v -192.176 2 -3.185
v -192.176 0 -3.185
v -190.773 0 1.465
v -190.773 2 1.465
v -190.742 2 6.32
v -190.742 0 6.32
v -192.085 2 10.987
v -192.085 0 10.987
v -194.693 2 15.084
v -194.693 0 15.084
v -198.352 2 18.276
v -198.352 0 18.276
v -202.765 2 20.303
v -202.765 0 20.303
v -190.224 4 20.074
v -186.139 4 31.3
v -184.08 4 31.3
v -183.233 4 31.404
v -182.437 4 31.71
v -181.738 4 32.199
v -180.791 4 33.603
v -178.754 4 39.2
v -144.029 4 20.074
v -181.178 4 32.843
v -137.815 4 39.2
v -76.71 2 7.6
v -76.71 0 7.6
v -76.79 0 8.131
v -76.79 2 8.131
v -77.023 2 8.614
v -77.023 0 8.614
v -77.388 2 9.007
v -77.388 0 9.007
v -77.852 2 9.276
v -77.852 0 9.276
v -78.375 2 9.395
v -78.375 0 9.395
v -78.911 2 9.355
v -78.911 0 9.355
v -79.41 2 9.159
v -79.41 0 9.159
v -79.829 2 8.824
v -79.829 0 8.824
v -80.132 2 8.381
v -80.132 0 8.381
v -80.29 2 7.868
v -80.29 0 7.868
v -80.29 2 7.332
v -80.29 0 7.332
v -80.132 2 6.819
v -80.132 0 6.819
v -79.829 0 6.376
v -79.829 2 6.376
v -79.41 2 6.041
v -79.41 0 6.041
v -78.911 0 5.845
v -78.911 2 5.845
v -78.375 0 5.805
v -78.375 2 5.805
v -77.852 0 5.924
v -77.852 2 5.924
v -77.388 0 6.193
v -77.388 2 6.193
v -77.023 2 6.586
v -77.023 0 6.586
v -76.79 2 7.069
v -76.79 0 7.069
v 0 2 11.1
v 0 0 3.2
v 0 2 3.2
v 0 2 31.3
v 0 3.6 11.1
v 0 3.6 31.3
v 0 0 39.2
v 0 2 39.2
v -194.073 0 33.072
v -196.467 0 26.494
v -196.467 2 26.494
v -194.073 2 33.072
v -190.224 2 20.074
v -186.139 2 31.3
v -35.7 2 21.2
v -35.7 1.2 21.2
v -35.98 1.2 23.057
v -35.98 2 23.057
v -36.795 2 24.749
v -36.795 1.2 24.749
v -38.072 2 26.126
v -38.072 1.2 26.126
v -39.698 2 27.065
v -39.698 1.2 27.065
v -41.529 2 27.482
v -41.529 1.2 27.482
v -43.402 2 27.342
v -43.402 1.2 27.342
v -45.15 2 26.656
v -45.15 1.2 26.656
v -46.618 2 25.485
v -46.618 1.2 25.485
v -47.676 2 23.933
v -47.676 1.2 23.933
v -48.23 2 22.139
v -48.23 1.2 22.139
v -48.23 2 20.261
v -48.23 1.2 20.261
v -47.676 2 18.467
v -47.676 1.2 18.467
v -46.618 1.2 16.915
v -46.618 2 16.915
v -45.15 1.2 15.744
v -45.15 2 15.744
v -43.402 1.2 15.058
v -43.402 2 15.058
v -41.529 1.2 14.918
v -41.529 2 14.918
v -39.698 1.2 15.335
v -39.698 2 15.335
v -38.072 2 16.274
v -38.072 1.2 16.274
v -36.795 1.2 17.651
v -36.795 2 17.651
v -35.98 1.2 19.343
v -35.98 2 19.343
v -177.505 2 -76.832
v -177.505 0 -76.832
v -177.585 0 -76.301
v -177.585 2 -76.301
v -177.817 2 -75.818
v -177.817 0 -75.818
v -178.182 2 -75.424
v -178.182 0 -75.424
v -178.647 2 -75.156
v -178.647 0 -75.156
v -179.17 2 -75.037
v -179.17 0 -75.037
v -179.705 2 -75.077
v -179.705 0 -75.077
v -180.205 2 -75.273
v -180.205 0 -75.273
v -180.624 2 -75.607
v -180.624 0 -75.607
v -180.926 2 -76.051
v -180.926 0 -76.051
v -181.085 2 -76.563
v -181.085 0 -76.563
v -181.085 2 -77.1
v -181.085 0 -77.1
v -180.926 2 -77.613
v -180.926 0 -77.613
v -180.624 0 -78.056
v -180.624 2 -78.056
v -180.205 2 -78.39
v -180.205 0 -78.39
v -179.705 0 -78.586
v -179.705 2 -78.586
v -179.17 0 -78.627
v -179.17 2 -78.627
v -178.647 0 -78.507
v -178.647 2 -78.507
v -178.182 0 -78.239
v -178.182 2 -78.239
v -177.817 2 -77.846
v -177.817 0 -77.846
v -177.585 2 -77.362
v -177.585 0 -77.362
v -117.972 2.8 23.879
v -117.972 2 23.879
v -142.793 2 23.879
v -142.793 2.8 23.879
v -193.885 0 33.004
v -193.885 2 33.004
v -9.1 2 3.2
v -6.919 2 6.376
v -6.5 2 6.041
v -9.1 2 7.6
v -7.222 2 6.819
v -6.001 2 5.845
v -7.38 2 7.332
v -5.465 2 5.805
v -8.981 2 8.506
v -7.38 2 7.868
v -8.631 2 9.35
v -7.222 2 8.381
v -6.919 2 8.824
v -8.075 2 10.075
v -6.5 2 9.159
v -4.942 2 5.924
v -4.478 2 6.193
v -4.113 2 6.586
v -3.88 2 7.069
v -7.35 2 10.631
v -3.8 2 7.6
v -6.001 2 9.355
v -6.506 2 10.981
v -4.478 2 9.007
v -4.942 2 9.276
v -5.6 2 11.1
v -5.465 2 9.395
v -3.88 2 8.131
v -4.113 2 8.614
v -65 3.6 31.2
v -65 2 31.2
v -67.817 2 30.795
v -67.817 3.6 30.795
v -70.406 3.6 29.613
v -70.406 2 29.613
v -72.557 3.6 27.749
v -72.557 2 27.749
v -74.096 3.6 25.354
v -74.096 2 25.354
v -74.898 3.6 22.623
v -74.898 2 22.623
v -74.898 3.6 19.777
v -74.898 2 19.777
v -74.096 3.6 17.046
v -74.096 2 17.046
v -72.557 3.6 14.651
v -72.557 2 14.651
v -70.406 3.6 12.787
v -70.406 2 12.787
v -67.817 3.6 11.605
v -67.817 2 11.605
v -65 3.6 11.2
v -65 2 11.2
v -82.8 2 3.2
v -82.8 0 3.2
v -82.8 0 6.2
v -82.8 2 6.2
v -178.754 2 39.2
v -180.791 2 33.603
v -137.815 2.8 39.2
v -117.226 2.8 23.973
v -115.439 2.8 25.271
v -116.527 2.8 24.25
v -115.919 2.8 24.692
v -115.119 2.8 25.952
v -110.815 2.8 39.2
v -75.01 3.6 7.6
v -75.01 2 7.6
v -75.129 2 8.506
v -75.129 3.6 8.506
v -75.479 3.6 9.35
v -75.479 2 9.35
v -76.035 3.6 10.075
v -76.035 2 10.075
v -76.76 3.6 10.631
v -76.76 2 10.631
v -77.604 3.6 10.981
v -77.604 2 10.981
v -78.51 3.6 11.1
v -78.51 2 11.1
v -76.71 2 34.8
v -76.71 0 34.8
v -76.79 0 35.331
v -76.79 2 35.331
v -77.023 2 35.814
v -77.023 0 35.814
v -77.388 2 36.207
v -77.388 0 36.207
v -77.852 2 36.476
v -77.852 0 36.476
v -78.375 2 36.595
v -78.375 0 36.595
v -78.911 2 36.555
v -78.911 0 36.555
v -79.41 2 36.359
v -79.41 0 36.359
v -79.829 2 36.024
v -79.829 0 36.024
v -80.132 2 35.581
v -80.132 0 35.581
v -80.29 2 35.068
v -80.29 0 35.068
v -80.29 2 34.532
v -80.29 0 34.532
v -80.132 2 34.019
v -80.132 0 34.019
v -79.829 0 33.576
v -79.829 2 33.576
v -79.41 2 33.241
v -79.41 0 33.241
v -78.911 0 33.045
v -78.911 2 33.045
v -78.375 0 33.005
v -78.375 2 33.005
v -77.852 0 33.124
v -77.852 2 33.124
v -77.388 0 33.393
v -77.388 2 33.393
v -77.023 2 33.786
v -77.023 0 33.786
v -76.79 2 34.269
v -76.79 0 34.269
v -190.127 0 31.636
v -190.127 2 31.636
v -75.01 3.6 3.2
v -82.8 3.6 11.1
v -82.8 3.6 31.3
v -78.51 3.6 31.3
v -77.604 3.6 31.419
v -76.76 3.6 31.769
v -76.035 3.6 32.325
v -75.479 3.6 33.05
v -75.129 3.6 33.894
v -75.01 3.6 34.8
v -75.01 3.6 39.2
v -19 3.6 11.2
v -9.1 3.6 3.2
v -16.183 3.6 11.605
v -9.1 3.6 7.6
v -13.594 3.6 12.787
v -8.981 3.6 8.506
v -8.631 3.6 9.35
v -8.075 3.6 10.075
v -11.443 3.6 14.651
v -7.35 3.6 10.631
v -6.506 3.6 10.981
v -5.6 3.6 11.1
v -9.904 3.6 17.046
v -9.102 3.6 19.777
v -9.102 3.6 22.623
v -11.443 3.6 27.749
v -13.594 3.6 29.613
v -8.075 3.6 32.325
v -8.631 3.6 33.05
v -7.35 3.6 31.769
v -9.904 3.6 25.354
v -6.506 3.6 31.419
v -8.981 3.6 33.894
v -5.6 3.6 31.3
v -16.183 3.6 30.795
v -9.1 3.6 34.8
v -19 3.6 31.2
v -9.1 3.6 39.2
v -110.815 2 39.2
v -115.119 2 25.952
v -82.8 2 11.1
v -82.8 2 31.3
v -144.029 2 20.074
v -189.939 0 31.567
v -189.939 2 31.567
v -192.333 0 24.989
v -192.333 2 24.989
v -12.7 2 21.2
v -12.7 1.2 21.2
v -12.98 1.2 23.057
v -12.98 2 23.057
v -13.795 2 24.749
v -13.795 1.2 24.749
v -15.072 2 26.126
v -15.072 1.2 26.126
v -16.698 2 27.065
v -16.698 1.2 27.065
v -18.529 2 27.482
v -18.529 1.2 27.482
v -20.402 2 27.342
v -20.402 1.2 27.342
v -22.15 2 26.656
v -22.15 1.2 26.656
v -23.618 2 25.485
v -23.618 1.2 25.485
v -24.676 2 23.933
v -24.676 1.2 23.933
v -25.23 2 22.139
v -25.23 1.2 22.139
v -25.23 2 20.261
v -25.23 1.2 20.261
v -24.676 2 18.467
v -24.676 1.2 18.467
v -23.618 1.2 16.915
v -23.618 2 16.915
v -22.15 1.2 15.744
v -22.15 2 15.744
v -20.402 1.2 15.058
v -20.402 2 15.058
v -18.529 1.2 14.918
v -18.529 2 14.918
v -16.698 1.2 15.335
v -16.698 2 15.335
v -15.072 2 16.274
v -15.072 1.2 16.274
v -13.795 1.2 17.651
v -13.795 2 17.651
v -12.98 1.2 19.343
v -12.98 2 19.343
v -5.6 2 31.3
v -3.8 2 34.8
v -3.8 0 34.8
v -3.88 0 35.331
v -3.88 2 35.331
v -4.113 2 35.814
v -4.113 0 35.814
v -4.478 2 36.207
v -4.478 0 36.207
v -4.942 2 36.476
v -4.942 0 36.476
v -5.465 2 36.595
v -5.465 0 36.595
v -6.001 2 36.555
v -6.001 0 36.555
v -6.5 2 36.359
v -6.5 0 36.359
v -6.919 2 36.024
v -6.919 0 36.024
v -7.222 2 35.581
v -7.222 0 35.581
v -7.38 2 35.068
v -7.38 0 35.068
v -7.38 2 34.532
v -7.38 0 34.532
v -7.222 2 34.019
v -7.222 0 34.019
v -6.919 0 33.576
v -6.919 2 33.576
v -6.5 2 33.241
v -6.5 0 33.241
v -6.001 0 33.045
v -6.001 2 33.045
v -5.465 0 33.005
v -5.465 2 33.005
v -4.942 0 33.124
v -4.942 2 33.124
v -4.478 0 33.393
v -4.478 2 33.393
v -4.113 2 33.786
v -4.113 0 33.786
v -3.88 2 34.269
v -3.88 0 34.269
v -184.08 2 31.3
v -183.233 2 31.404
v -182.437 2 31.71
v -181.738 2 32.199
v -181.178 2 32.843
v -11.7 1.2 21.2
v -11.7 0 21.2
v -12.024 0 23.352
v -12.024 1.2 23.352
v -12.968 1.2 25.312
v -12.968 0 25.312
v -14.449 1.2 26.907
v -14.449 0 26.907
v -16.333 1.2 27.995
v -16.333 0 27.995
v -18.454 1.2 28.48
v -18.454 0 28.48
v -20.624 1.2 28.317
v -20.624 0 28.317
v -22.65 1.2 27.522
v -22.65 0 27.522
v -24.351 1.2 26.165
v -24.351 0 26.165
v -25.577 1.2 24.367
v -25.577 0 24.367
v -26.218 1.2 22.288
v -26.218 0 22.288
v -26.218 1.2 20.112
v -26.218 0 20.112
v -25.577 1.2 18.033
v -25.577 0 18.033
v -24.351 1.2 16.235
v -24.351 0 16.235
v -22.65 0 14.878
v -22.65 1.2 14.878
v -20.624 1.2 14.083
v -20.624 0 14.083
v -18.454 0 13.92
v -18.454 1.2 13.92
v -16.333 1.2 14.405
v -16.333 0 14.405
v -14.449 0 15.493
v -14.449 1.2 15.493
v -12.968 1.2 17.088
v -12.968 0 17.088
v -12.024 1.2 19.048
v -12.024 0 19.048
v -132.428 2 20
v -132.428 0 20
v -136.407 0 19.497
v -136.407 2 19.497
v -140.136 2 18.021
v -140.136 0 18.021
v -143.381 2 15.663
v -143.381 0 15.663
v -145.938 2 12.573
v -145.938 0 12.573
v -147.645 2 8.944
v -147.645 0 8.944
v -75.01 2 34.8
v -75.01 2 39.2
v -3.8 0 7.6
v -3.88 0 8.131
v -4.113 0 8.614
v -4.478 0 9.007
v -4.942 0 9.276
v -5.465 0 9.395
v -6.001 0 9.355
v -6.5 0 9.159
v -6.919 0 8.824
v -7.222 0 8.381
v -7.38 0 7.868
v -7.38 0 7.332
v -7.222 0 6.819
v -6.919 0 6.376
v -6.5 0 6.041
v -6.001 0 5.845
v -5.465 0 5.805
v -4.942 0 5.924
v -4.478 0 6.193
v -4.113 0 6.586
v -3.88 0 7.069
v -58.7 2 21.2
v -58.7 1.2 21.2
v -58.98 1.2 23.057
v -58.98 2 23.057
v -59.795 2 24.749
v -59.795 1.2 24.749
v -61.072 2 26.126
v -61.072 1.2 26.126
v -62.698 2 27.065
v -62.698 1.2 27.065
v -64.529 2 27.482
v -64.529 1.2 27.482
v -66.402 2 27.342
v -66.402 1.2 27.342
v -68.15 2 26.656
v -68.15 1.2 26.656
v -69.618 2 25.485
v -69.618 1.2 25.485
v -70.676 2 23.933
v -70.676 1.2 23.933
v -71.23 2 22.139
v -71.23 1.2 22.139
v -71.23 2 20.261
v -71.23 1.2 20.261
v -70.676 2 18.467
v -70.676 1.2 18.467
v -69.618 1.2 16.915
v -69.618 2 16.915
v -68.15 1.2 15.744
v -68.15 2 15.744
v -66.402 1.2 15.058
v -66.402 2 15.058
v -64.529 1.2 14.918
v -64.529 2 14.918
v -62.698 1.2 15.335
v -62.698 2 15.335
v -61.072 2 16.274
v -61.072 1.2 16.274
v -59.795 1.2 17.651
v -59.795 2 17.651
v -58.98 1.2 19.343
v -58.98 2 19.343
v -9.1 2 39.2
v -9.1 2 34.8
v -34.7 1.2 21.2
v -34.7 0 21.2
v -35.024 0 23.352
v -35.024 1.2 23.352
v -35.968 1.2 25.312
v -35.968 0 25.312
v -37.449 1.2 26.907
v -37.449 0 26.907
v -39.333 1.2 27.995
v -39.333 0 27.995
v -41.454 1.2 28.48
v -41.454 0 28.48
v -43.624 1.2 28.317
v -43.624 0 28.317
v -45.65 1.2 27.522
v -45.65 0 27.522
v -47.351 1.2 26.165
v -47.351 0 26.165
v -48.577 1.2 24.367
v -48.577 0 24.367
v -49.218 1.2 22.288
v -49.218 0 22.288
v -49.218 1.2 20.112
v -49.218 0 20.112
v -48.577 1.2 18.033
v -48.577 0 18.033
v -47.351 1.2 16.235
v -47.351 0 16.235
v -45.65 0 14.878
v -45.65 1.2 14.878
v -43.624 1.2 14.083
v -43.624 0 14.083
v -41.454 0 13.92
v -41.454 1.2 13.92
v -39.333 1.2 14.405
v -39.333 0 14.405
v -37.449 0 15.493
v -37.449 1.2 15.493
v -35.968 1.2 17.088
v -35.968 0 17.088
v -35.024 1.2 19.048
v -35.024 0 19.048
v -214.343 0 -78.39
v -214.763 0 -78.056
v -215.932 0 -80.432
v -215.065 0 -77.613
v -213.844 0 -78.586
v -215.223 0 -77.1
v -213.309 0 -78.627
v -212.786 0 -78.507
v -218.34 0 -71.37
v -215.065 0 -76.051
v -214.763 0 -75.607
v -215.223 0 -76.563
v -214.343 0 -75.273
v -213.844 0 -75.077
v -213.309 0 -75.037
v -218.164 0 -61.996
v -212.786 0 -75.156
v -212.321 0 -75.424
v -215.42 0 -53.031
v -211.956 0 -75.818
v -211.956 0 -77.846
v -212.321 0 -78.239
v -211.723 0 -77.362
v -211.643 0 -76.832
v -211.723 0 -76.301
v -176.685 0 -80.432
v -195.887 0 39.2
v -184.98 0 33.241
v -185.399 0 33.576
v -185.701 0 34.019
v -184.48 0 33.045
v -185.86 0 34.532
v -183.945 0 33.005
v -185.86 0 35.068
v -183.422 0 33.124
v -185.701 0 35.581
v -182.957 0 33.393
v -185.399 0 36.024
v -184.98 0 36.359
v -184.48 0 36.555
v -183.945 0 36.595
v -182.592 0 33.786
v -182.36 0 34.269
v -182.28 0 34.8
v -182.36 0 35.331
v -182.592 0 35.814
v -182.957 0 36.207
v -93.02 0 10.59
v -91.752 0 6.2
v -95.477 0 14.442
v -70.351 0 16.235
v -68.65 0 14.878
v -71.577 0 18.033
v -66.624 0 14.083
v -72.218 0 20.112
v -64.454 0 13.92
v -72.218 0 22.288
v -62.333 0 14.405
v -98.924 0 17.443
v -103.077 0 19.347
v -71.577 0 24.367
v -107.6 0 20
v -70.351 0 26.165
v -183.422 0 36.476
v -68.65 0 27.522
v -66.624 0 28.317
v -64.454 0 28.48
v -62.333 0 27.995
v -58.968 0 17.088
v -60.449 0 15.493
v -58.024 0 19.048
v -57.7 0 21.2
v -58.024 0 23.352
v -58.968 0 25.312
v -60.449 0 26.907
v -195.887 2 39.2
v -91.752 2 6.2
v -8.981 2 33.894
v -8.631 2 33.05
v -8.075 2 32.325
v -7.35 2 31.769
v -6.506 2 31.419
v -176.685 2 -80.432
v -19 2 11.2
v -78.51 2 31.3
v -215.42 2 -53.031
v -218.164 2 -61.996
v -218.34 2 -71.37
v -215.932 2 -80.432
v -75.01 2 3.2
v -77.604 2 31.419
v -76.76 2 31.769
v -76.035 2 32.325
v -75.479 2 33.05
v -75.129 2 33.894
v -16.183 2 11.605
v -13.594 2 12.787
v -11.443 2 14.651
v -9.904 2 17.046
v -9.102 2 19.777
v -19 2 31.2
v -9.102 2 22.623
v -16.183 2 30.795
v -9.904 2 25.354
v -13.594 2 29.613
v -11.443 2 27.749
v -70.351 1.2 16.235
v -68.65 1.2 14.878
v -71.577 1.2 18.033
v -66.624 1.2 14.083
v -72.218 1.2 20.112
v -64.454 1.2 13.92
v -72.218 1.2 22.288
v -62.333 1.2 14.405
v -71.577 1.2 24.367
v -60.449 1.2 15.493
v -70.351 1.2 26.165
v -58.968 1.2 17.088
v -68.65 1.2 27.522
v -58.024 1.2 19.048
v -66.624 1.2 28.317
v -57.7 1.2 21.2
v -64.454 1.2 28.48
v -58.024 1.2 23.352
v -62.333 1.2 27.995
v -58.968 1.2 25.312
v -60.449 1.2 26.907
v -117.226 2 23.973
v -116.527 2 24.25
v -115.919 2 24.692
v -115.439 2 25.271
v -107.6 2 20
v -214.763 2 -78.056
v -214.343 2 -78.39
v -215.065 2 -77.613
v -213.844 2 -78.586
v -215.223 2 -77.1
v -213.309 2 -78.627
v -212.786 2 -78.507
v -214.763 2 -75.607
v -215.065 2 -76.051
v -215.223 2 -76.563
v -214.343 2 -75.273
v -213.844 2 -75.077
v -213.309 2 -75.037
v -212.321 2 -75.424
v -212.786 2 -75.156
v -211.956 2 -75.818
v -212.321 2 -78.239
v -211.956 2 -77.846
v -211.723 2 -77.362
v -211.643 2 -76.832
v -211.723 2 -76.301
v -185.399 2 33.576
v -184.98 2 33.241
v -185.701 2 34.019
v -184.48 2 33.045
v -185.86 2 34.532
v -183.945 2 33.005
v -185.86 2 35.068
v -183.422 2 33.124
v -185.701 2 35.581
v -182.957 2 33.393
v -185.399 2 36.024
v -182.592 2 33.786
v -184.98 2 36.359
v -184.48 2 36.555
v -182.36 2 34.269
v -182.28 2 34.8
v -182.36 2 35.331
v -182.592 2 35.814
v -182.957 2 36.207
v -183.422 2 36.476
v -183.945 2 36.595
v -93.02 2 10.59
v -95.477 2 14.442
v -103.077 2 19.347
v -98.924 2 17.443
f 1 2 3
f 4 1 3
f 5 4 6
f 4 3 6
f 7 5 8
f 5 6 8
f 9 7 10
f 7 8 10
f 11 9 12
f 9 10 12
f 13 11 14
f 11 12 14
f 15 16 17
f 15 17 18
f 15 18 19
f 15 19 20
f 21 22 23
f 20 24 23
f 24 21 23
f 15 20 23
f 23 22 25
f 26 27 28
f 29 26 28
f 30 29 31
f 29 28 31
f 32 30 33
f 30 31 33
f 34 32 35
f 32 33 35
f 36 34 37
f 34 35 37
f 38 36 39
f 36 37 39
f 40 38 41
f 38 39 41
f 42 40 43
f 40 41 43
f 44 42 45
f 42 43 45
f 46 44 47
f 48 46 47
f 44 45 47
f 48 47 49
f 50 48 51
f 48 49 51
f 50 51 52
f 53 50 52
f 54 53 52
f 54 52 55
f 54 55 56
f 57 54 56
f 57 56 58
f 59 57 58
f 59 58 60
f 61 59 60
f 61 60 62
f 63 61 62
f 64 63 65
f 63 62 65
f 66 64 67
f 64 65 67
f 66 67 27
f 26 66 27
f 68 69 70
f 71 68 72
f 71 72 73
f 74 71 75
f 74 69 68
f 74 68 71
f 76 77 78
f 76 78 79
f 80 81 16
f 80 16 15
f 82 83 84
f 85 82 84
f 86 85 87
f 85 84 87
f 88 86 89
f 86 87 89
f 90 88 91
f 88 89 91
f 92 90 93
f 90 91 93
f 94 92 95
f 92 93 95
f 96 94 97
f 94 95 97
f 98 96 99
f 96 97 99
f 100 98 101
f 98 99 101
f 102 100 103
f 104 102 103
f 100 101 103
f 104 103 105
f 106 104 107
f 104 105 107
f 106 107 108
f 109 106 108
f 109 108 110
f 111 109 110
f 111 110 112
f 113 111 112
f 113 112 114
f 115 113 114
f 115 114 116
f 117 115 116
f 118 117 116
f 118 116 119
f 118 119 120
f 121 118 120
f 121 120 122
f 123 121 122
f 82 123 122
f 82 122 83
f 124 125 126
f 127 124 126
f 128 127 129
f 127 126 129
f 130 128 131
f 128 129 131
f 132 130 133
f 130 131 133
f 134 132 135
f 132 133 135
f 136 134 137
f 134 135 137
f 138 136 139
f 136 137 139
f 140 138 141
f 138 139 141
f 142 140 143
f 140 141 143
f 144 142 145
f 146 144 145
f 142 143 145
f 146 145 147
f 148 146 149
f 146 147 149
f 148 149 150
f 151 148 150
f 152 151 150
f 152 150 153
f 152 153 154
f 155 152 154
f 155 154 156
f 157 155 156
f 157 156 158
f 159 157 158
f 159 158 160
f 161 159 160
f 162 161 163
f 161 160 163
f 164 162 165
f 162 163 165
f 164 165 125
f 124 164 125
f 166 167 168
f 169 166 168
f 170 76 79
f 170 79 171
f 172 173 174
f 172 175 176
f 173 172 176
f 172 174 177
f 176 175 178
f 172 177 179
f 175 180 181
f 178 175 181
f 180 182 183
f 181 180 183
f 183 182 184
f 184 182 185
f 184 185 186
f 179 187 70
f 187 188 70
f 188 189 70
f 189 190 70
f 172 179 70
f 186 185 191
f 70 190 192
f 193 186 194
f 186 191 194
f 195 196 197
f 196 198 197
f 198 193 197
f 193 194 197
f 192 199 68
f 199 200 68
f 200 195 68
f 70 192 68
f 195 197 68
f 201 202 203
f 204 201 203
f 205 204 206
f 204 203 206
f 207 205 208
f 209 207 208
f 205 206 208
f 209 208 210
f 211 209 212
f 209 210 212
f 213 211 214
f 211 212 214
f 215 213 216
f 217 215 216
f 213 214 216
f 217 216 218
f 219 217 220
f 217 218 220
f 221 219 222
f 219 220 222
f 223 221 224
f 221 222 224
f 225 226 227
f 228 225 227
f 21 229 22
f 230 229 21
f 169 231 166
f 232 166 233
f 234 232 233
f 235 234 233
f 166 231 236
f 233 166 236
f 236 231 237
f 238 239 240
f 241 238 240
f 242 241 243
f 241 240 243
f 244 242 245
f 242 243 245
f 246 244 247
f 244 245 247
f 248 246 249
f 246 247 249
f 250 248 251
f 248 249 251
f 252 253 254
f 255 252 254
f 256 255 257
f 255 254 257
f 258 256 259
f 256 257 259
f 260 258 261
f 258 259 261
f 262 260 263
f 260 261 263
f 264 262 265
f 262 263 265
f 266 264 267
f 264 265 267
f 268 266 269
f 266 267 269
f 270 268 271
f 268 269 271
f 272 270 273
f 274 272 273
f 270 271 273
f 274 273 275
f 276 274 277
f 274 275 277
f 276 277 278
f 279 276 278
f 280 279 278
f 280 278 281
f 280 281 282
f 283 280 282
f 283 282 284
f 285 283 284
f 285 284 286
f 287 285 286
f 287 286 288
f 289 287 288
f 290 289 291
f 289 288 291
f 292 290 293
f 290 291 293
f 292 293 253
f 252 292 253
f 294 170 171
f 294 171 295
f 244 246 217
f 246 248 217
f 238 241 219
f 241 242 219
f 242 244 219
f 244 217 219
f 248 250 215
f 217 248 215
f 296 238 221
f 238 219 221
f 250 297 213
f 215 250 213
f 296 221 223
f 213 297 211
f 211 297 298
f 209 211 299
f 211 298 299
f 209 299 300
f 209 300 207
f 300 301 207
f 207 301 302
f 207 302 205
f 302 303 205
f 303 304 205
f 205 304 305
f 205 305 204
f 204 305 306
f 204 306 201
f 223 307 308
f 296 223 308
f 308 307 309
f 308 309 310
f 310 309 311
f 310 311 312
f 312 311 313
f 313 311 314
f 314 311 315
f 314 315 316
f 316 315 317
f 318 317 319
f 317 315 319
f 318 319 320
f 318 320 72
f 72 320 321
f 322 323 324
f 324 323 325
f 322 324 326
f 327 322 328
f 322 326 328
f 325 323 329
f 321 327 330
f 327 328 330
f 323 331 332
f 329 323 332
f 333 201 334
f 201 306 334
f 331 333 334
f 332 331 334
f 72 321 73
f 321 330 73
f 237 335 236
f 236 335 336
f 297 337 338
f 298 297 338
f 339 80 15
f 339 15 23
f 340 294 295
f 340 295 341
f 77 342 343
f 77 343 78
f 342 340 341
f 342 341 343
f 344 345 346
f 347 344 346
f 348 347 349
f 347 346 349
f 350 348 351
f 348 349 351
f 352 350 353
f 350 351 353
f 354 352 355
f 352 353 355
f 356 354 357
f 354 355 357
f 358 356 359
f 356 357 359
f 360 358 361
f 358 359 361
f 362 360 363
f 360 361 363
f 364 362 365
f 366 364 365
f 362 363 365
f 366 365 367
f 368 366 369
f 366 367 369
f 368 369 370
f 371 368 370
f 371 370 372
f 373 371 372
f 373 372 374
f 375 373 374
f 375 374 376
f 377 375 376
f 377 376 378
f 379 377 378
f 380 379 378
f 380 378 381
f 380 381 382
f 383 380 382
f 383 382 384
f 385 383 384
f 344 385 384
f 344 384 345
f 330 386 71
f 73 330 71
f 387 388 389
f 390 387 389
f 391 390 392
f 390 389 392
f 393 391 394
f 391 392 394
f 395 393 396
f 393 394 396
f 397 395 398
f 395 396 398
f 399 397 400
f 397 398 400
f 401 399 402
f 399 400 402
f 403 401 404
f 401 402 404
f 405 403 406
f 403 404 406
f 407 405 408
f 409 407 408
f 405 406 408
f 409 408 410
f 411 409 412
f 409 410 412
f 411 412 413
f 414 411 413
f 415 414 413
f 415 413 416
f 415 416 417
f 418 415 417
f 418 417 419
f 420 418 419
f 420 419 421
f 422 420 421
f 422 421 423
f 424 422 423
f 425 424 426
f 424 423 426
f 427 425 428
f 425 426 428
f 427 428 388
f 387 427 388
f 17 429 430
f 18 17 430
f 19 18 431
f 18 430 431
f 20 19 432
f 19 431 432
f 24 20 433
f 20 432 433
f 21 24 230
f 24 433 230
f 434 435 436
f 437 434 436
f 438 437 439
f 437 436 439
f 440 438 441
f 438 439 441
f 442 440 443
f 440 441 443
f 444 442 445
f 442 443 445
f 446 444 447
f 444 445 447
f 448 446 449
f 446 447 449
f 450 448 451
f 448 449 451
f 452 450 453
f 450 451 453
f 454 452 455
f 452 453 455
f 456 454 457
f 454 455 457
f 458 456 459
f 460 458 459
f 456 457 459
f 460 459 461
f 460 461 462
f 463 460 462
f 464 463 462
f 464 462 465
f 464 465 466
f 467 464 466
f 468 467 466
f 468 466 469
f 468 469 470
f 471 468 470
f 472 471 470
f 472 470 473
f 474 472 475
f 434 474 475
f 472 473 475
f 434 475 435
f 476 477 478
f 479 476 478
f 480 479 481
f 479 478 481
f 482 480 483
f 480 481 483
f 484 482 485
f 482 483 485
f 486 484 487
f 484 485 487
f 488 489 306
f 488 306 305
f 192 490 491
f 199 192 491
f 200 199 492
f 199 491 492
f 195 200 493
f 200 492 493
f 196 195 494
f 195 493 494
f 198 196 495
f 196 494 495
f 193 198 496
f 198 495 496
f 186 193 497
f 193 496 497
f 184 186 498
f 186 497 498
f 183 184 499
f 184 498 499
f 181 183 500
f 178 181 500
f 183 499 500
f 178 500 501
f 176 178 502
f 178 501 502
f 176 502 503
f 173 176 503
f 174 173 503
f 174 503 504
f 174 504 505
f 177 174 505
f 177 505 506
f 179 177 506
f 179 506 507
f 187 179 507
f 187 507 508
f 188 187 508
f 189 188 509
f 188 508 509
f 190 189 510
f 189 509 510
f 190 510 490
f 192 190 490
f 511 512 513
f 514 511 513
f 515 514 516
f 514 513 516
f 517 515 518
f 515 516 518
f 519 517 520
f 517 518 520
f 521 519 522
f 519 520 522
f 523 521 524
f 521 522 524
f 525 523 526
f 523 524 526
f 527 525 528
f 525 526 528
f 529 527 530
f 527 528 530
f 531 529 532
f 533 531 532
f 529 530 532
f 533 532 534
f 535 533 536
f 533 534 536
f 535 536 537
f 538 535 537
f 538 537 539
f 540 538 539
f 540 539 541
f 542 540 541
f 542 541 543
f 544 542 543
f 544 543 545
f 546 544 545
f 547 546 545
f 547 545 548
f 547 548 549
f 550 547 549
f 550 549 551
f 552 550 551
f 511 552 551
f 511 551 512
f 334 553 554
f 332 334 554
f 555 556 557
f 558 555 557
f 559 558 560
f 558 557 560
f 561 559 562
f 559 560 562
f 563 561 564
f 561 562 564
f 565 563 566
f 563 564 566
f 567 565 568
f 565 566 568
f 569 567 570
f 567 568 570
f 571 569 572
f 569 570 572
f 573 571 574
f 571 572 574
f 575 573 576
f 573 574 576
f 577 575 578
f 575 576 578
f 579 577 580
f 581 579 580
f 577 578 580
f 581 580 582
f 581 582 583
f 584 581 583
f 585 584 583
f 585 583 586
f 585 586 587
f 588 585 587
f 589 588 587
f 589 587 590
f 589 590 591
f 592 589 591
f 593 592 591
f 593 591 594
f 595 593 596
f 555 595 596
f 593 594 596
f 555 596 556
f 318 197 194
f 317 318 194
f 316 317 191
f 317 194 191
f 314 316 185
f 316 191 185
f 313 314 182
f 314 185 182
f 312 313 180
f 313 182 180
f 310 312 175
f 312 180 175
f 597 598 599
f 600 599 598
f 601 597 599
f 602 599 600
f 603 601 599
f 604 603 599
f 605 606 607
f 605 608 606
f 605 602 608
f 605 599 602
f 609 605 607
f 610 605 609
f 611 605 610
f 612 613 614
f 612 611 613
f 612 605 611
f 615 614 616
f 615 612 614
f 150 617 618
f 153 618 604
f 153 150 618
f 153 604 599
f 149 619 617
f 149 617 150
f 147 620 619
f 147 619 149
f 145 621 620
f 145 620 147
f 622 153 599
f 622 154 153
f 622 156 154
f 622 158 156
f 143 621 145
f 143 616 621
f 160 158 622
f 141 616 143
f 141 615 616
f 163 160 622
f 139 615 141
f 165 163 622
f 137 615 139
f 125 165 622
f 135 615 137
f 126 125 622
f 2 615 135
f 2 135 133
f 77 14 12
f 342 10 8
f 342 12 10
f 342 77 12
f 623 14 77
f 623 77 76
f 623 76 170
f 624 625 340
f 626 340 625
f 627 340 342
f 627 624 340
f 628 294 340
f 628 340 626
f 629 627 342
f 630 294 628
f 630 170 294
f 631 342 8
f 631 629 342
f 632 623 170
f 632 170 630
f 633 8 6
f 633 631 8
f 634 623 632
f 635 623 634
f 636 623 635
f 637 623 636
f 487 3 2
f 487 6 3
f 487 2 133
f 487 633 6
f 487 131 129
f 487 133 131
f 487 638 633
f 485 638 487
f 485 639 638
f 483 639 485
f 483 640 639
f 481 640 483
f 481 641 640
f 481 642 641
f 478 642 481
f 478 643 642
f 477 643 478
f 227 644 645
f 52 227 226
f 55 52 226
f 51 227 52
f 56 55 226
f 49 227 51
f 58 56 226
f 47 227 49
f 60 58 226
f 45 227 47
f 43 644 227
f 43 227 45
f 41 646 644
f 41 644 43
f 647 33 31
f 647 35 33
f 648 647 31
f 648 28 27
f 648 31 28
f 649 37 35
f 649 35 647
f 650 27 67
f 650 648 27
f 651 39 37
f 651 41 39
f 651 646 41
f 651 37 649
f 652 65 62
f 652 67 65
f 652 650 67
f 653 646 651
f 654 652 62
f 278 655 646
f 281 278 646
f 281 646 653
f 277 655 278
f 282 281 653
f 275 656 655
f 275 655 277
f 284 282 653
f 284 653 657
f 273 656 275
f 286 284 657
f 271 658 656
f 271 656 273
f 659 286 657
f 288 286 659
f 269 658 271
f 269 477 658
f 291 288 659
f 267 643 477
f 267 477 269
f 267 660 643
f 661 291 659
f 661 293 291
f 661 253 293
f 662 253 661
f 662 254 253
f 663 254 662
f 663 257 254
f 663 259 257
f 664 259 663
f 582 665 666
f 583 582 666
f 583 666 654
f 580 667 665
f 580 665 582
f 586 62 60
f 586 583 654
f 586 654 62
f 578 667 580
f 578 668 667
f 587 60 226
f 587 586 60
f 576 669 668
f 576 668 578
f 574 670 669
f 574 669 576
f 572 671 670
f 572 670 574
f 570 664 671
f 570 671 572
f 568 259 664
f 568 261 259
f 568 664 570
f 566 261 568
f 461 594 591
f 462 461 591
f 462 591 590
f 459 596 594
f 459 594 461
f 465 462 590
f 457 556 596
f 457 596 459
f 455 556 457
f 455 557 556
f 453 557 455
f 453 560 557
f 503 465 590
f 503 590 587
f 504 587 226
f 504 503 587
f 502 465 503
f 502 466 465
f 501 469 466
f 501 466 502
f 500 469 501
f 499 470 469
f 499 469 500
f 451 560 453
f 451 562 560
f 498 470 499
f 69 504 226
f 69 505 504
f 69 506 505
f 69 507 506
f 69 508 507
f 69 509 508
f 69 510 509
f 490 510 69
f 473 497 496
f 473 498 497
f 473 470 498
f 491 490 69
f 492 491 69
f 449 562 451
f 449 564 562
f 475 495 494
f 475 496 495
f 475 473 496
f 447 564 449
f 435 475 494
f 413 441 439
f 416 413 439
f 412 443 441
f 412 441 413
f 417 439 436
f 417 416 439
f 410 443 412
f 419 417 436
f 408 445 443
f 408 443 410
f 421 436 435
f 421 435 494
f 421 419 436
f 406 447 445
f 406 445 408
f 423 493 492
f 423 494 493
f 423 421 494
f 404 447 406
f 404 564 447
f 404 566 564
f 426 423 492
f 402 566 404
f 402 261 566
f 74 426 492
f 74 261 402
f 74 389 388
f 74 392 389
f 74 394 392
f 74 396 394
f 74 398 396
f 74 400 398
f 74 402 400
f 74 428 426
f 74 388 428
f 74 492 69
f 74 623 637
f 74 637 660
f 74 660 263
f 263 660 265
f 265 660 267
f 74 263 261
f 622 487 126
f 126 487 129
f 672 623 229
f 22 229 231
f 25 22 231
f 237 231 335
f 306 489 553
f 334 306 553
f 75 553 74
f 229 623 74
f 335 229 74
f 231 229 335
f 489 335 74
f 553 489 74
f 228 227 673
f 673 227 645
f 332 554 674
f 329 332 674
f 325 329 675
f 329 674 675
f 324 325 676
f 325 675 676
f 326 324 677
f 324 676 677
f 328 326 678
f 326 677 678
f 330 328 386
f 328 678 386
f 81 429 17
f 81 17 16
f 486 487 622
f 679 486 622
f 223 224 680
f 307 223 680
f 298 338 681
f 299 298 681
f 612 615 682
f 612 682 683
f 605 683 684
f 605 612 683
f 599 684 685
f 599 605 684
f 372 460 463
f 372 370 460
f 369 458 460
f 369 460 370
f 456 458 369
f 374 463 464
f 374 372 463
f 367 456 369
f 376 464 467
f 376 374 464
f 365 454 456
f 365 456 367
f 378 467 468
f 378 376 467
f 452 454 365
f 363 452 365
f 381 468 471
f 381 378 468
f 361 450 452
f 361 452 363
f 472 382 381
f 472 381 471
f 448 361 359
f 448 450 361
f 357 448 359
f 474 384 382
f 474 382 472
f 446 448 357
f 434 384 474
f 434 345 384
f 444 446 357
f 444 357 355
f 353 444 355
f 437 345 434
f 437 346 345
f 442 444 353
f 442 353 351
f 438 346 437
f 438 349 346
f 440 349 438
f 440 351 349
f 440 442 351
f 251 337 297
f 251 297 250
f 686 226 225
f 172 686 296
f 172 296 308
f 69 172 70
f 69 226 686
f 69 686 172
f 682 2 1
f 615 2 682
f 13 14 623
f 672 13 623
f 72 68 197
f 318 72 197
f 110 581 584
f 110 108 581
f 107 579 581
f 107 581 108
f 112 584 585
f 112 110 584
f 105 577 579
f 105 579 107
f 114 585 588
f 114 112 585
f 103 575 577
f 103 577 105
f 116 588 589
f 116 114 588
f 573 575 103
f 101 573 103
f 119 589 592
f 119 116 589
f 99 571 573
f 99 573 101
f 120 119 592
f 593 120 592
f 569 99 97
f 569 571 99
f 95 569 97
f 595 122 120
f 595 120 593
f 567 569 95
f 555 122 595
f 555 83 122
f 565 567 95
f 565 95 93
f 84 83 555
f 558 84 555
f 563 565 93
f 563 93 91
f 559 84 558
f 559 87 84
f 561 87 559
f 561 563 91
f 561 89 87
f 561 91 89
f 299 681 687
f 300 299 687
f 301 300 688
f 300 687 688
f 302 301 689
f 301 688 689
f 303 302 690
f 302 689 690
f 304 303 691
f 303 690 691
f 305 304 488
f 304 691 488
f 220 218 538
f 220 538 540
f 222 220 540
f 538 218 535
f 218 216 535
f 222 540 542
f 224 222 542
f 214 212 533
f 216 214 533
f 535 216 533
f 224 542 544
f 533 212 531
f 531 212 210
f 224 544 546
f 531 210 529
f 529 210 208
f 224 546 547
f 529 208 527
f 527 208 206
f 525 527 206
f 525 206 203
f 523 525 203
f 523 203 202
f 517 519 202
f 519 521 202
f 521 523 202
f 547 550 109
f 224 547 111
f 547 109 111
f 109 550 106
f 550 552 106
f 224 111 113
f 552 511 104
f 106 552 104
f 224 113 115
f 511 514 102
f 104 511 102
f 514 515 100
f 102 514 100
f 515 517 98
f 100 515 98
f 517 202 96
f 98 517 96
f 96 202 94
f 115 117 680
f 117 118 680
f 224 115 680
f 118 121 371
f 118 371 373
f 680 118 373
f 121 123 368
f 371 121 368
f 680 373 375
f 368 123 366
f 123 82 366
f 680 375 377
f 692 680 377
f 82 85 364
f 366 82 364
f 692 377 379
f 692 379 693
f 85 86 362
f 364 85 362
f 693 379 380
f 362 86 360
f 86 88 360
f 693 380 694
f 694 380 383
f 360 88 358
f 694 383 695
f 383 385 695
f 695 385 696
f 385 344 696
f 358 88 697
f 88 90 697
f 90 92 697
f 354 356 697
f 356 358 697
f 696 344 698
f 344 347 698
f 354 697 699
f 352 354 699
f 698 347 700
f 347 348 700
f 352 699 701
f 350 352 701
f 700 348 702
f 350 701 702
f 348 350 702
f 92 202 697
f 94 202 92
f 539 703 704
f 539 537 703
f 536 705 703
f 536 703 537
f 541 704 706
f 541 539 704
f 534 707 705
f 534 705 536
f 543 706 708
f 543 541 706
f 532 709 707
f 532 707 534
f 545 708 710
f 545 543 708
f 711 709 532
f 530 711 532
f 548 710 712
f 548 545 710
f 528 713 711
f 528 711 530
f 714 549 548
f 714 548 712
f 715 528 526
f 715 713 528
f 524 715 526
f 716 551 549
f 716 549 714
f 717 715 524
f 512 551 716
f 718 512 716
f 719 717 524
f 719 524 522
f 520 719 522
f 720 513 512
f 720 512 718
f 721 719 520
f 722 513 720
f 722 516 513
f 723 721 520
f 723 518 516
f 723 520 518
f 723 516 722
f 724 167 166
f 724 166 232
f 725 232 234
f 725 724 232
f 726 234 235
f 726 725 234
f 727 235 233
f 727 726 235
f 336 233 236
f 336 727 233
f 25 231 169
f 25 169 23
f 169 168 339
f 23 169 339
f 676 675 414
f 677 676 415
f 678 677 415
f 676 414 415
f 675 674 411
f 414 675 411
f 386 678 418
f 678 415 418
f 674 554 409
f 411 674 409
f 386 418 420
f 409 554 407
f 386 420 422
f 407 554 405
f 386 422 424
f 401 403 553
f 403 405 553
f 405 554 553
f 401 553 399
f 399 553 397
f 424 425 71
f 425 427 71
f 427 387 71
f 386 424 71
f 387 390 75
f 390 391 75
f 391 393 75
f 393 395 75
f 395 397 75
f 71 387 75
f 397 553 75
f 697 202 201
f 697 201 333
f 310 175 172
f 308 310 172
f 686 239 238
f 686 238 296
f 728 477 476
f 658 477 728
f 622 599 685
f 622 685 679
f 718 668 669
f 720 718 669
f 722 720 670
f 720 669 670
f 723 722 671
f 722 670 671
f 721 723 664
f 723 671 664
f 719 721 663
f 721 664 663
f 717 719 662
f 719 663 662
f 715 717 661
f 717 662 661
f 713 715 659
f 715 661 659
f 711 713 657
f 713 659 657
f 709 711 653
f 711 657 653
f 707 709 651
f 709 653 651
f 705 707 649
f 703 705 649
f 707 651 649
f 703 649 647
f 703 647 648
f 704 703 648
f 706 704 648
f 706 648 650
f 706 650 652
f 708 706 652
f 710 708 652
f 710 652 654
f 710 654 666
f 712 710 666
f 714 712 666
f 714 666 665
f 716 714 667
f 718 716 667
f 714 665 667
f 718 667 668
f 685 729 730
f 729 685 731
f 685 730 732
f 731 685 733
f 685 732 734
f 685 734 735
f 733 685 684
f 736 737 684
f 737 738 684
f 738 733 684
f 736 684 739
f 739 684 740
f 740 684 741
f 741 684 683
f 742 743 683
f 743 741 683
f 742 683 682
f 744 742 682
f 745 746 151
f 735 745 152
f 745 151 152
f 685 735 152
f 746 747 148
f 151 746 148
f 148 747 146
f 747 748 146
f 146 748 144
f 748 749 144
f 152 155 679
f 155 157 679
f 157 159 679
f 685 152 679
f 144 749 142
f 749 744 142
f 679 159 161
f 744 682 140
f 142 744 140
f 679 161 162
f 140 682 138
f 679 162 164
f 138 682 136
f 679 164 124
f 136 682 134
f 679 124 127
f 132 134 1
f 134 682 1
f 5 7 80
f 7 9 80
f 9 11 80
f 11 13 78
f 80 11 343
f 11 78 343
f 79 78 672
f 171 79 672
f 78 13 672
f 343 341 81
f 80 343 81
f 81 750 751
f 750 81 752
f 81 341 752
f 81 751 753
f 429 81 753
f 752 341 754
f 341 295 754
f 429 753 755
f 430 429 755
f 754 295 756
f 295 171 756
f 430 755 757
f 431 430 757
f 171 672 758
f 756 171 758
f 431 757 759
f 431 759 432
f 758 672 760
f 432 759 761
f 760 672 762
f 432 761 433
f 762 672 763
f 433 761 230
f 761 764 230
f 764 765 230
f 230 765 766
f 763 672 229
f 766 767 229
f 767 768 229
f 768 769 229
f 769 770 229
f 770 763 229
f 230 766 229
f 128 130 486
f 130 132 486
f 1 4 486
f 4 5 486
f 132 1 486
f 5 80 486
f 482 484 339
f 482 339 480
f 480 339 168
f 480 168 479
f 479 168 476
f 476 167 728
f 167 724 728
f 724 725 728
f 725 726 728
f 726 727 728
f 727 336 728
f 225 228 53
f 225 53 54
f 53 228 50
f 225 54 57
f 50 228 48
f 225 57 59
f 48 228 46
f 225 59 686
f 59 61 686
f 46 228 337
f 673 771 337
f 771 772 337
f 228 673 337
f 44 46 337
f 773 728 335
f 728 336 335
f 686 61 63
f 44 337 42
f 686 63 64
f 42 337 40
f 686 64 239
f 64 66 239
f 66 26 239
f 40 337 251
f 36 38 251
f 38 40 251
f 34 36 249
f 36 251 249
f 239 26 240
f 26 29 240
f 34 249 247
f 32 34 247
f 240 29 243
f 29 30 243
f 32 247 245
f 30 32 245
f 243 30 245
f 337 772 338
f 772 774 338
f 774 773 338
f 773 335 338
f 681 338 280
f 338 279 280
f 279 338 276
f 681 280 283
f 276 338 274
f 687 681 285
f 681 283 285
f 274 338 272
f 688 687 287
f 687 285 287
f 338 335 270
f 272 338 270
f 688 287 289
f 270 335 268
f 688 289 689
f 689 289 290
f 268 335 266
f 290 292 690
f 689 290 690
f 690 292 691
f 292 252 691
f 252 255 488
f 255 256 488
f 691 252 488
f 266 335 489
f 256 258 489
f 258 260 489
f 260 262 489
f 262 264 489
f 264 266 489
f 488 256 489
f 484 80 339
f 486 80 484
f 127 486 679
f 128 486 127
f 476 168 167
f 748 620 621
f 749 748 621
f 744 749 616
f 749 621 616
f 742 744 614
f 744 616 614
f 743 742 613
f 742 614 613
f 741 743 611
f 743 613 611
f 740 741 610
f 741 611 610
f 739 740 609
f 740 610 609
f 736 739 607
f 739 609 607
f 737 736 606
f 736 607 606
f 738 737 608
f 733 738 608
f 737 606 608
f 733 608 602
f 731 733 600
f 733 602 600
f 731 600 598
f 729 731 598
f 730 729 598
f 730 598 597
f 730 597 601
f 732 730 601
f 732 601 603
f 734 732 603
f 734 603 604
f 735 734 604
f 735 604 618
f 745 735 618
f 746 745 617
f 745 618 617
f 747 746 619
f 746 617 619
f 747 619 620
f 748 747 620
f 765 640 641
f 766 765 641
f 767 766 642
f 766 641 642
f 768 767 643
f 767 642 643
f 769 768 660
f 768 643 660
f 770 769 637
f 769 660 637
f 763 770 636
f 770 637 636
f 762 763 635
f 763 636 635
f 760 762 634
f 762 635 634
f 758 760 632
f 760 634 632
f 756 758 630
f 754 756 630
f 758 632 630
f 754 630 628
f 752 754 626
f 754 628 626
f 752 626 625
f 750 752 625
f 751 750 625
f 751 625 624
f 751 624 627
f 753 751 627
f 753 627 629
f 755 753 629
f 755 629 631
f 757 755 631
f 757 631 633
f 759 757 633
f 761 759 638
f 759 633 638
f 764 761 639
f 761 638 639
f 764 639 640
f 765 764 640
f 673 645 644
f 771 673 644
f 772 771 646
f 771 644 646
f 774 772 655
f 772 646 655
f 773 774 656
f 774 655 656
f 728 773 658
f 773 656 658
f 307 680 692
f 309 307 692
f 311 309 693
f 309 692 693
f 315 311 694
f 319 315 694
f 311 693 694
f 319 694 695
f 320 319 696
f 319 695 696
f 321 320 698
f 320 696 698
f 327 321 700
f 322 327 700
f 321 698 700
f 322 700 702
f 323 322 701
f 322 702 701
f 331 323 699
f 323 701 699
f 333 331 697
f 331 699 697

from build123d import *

# Parameters (mm, degrees)
EXTRUDE086_DEPTH = 0.8
EXTRUDE087_DEPTH = 2
SKETCH084_R      = 1.8
EXTRUDE084_DEPTH = 1.6
SKETCH082_W      = 82.8
SKETCH082_H      = 36
SKETCH082_R      = 1.8
EXTRUDE082_DEPTH = 1.6
SKETCH076_R      = 7.3
EXTRUDE077_DEPTH = 1.2
SKETCH074_R      = 1.8
SKETCH074_R_2    = 6.3
EXTRUDE076_DEPTH = 2


with BuildPart() as extrude_lato_sx_pistola_rialzo_centrale:
    # Sketch086 → Extrude086 (new body)
    with BuildSketch(Plane(origin=(0, 0, 2), x_dir=(1, 0, 0), z_dir=(0, -1, 0))):
        with BuildLine():
            Line((-137.814627, 37.2), (-142.792829, 21.878669))
            Line((-117.972457, 21.878669), (-142.792829, 21.878669))
            ThreePointArc((-117.972457, 21.878669), (-116.209101, 22.451618), (-115.119287, 23.951618))
            Line((-110.814627, 37.2), (-115.119287, 23.951618))
            Line((-137.814627, 37.2), (-110.814627, 37.2))
        make_face()
    extrude(amount=-EXTRUDE086_DEPTH)


with BuildPart() as extrude_lato_sx_pistola_rialzo_centrale_1:
    # Extrude086 placement: moved
    add(extrude_lato_sx_pistola_rialzo_centrale.part.moved(Location((0, 2, 0))))


with BuildPart() as extrude087:
    # Sketch087 → Extrude087 (new body)
    with BuildSketch(Plane.XZ):
        with BuildLine():
            Line((-181.329747, 20.074442), (-144.028897, 20.074442))
            Line((-137.814627, 39.2), (-144.028897, 20.074442))
            Line((-178.753577, 39.2), (-137.814627, 39.2))
            Line((-178.753577, 39.2), (-180.790744, 33.602929))
            ThreePointArc((-184.079668, 31.3), (-182.07215, 31.932968), (-180.790744, 33.602929))
            Line((-184.079668, 31.3), (-186.138695, 31.3))
            Line((-186.138695, 31.3), (-190.224464, 20.074442))
            Line((-181.329747, 20.074442), (-190.224464, 20.074442))
        make_face()
    extrude(amount=-EXTRUDE087_DEPTH)


with BuildPart() as extrude087_1:
    # Extrude087 placement: moved
    add(extrude087.part.moved(Location((0, 2, 0))))


with BuildPart() as extrude084:
    # Sketch084 → Extrude084 (new body)
    with BuildSketch(Plane.XZ):
        with BuildLine():
            ThreePointArc((-78.51, 31.3), (-76.035126, 32.325126), (-75.01, 34.8))
            Line((-75.01, 39.2), (-75.01, 34.8))
            Line((-82.8, 39.2), (-75.01, 39.2))
            Line((-82.8, 31.3), (-82.8, 39.2))
            Line((-82.8, 31.3), (-78.51, 31.3))
        make_face()
        with Locations((-78.51, 34.8)):
            Circle(SKETCH084_R, mode=Mode.SUBTRACT)
        with BuildLine():
            ThreePointArc((-9.1, 34.8), (-8.074874, 32.325126), (-5.6, 31.3))
            Line((-5.6, 31.3), (0, 31.3))
            Line((0, 39.2), (0, 31.3))
            Line((-9.1, 39.2), (0, 39.2))
            Line((-9.1, 39.2), (-9.1, 34.8))
        make_face()
        with Locations((-5.6, 34.8)):
            Circle(SKETCH084_R, mode=Mode.SUBTRACT)
        with BuildLine():
            ThreePointArc((-75.01, 7.6), (-76.035126, 10.074874), (-78.51, 11.1))
            Line((-82.8, 11.1), (-78.51, 11.1))
            Line((-82.8, 3.2), (-82.8, 11.1))
            Line((-75.01, 3.2), (-82.8, 3.2))
            Line((-75.01, 7.6), (-75.01, 3.2))
        make_face()
        with Locations((-78.51, 7.6)):
            Circle(SKETCH084_R, mode=Mode.SUBTRACT)
        with BuildLine():
            ThreePointArc((-5.6, 11.1), (-8.074874, 10.074874), (-9.1, 7.6))
            Line((-9.1, 7.6), (-9.1, 3.2))
            Line((0, 3.2), (-9.1, 3.2))
            Line((0, 11.1), (0, 3.2))
            Line((0, 11.1), (-5.6, 11.1))
        make_face()
        with Locations((-5.6, 7.6)):
            Circle(SKETCH084_R, mode=Mode.SUBTRACT)
    extrude(amount=-EXTRUDE084_DEPTH)


with BuildPart() as extrude084_1:
    # Extrude084 placement: moved
    add(extrude084.part.moved(Location((0, 2, 0))))


with BuildPart() as cut047:
    # Sketch082 → Extrude082 (new body)
    with BuildSketch(Plane.XZ):
        with Locations((-41.4, 21.2)):
            Rectangle(SKETCH082_W, SKETCH082_H)
        with Locations((-78.51, 34.8)):
            Circle(SKETCH082_R, mode=Mode.SUBTRACT)
        with Locations((-5.6, 34.8)):
            Circle(SKETCH082_R, mode=Mode.SUBTRACT)
        with Locations((-5.6, 7.6)):
            Circle(SKETCH082_R, mode=Mode.SUBTRACT)
        with Locations((-78.51, 7.6)):
            Circle(SKETCH082_R, mode=Mode.SUBTRACT)
        with BuildLine():
            ThreePointArc((-65, 31.2), (-75, 21.2), (-65, 11.2))
            Line((-65, 11.2), (-19, 11.2))
            ThreePointArc((-19, 11.2), (-9, 21.2), (-19, 31.2))
            Line((-65, 31.2), (-19, 31.2))
        make_face(mode=Mode.SUBTRACT)
    extrude(amount=-EXTRUDE082_DEPTH)


with BuildPart() as cut047_1:
    # Extrude082 placement: moved
    add(cut047.part.moved(Location((0, 2, 0))))

    # Cut047: cut Extrude084
    add(extrude084_1.part, mode=Mode.SUBTRACT)


with BuildPart() as extrude_lato_sx_pistola_scavi_pulsanti:
    # Sketch076 → Extrude077 (new body)
    with BuildSketch(Plane.XZ):
        with Locations((-65, 21.2)):
            Circle(SKETCH076_R)
        with Locations((-42, 21.2)):
            Circle(SKETCH076_R)
        with Locations((-19, 21.2)):
            Circle(SKETCH076_R)
    extrude(amount=-EXTRUDE077_DEPTH)


with BuildPart() as fusion007:
    # Sketch074 → Extrude076 (new body)
    with BuildSketch(Plane.XZ):
        with BuildLine():
            Line((-82.8, 3.2), (0, 3.2))
            Line((0, 3.2), (0, 39.2))
            Line((-195.886839, 39.2), (0, 39.2))
            Line((-202.764796, 20.302968), (-195.886839, 39.2))
            ThreePointArc((-192.175575, -3.18451), (-192.085048, 10.987093), (-202.764796, 20.302968))
            Line((-192.175575, -3.18451), (-215.419579, -53.031439))
            ThreePointArc((-215.419579, -53.031439), (-218.578907, -66.677212), (-215.93199, -80.431568))
            Line((-215.93199, -80.431568), (-176.68528, -80.431568))
            Line((-147.645309, 8.944272), (-176.68528, -80.431568))
            ThreePointArc((-132.428405, 20), (-141.832969, 16.944272), (-147.645309, 8.944272))
            Line((-132.428405, 20), (-107.6, 20))
            ThreePointArc((-91.751972, 6.2), (-97.09286, 16.066483), (-107.6, 20))
            Line((-82.8, 6.2), (-91.751972, 6.2))
            Line((-82.8, 3.2), (-82.8, 6.2))
        make_face()
        with Locations((-213.443268, -76.831568)):
            Circle(SKETCH074_R, mode=Mode.SUBTRACT)
        with Locations((-179.304663, -76.831568)):
            Circle(SKETCH074_R, mode=Mode.SUBTRACT)
        with Locations((-184.079668, 34.8)):
            Circle(SKETCH074_R, mode=Mode.SUBTRACT)
        with Locations((-78.51, 34.8)):
            Circle(SKETCH074_R, mode=Mode.SUBTRACT)
        with Locations((-78.51, 7.6)):
            Circle(SKETCH074_R, mode=Mode.SUBTRACT)
        with Locations((-5.6, 34.8)):
            Circle(SKETCH074_R, mode=Mode.SUBTRACT)
        with Locations((-5.6, 7.6)):
            Circle(SKETCH074_R, mode=Mode.SUBTRACT)
        with Locations((-19, 21.2)):
            Circle(SKETCH074_R_2, mode=Mode.SUBTRACT)
        with Locations((-42, 21.2)):
            Circle(SKETCH074_R_2, mode=Mode.SUBTRACT)
        with Locations((-65, 21.2)):
            Circle(SKETCH074_R_2, mode=Mode.SUBTRACT)
        Polygon((-189.938695, 31.567195), (-192.332836, 24.989347), (-196.467483, 26.494236), (-194.073342, 33.072084), (-193.885404, 33.00368), (-190.126633, 31.635599), align=None, mode=Mode.SUBTRACT)
    extrude(amount=-EXTRUDE076_DEPTH)

    # Cut044: cut Extrude lato sx pistola - scavi pulsanti
    add(extrude_lato_sx_pistola_scavi_pulsanti.part, mode=Mode.SUBTRACT)

    # Fusion005: union Cut047
    add(cut047_1.part)

    # Fusion007: union Extrude lato sx pistola - rialzo centrale, Extrude087
    add(extrude_lato_sx_pistola_rialzo_centrale_1.part)
    add(extrude087_1.part)


solid = fusion007.part
